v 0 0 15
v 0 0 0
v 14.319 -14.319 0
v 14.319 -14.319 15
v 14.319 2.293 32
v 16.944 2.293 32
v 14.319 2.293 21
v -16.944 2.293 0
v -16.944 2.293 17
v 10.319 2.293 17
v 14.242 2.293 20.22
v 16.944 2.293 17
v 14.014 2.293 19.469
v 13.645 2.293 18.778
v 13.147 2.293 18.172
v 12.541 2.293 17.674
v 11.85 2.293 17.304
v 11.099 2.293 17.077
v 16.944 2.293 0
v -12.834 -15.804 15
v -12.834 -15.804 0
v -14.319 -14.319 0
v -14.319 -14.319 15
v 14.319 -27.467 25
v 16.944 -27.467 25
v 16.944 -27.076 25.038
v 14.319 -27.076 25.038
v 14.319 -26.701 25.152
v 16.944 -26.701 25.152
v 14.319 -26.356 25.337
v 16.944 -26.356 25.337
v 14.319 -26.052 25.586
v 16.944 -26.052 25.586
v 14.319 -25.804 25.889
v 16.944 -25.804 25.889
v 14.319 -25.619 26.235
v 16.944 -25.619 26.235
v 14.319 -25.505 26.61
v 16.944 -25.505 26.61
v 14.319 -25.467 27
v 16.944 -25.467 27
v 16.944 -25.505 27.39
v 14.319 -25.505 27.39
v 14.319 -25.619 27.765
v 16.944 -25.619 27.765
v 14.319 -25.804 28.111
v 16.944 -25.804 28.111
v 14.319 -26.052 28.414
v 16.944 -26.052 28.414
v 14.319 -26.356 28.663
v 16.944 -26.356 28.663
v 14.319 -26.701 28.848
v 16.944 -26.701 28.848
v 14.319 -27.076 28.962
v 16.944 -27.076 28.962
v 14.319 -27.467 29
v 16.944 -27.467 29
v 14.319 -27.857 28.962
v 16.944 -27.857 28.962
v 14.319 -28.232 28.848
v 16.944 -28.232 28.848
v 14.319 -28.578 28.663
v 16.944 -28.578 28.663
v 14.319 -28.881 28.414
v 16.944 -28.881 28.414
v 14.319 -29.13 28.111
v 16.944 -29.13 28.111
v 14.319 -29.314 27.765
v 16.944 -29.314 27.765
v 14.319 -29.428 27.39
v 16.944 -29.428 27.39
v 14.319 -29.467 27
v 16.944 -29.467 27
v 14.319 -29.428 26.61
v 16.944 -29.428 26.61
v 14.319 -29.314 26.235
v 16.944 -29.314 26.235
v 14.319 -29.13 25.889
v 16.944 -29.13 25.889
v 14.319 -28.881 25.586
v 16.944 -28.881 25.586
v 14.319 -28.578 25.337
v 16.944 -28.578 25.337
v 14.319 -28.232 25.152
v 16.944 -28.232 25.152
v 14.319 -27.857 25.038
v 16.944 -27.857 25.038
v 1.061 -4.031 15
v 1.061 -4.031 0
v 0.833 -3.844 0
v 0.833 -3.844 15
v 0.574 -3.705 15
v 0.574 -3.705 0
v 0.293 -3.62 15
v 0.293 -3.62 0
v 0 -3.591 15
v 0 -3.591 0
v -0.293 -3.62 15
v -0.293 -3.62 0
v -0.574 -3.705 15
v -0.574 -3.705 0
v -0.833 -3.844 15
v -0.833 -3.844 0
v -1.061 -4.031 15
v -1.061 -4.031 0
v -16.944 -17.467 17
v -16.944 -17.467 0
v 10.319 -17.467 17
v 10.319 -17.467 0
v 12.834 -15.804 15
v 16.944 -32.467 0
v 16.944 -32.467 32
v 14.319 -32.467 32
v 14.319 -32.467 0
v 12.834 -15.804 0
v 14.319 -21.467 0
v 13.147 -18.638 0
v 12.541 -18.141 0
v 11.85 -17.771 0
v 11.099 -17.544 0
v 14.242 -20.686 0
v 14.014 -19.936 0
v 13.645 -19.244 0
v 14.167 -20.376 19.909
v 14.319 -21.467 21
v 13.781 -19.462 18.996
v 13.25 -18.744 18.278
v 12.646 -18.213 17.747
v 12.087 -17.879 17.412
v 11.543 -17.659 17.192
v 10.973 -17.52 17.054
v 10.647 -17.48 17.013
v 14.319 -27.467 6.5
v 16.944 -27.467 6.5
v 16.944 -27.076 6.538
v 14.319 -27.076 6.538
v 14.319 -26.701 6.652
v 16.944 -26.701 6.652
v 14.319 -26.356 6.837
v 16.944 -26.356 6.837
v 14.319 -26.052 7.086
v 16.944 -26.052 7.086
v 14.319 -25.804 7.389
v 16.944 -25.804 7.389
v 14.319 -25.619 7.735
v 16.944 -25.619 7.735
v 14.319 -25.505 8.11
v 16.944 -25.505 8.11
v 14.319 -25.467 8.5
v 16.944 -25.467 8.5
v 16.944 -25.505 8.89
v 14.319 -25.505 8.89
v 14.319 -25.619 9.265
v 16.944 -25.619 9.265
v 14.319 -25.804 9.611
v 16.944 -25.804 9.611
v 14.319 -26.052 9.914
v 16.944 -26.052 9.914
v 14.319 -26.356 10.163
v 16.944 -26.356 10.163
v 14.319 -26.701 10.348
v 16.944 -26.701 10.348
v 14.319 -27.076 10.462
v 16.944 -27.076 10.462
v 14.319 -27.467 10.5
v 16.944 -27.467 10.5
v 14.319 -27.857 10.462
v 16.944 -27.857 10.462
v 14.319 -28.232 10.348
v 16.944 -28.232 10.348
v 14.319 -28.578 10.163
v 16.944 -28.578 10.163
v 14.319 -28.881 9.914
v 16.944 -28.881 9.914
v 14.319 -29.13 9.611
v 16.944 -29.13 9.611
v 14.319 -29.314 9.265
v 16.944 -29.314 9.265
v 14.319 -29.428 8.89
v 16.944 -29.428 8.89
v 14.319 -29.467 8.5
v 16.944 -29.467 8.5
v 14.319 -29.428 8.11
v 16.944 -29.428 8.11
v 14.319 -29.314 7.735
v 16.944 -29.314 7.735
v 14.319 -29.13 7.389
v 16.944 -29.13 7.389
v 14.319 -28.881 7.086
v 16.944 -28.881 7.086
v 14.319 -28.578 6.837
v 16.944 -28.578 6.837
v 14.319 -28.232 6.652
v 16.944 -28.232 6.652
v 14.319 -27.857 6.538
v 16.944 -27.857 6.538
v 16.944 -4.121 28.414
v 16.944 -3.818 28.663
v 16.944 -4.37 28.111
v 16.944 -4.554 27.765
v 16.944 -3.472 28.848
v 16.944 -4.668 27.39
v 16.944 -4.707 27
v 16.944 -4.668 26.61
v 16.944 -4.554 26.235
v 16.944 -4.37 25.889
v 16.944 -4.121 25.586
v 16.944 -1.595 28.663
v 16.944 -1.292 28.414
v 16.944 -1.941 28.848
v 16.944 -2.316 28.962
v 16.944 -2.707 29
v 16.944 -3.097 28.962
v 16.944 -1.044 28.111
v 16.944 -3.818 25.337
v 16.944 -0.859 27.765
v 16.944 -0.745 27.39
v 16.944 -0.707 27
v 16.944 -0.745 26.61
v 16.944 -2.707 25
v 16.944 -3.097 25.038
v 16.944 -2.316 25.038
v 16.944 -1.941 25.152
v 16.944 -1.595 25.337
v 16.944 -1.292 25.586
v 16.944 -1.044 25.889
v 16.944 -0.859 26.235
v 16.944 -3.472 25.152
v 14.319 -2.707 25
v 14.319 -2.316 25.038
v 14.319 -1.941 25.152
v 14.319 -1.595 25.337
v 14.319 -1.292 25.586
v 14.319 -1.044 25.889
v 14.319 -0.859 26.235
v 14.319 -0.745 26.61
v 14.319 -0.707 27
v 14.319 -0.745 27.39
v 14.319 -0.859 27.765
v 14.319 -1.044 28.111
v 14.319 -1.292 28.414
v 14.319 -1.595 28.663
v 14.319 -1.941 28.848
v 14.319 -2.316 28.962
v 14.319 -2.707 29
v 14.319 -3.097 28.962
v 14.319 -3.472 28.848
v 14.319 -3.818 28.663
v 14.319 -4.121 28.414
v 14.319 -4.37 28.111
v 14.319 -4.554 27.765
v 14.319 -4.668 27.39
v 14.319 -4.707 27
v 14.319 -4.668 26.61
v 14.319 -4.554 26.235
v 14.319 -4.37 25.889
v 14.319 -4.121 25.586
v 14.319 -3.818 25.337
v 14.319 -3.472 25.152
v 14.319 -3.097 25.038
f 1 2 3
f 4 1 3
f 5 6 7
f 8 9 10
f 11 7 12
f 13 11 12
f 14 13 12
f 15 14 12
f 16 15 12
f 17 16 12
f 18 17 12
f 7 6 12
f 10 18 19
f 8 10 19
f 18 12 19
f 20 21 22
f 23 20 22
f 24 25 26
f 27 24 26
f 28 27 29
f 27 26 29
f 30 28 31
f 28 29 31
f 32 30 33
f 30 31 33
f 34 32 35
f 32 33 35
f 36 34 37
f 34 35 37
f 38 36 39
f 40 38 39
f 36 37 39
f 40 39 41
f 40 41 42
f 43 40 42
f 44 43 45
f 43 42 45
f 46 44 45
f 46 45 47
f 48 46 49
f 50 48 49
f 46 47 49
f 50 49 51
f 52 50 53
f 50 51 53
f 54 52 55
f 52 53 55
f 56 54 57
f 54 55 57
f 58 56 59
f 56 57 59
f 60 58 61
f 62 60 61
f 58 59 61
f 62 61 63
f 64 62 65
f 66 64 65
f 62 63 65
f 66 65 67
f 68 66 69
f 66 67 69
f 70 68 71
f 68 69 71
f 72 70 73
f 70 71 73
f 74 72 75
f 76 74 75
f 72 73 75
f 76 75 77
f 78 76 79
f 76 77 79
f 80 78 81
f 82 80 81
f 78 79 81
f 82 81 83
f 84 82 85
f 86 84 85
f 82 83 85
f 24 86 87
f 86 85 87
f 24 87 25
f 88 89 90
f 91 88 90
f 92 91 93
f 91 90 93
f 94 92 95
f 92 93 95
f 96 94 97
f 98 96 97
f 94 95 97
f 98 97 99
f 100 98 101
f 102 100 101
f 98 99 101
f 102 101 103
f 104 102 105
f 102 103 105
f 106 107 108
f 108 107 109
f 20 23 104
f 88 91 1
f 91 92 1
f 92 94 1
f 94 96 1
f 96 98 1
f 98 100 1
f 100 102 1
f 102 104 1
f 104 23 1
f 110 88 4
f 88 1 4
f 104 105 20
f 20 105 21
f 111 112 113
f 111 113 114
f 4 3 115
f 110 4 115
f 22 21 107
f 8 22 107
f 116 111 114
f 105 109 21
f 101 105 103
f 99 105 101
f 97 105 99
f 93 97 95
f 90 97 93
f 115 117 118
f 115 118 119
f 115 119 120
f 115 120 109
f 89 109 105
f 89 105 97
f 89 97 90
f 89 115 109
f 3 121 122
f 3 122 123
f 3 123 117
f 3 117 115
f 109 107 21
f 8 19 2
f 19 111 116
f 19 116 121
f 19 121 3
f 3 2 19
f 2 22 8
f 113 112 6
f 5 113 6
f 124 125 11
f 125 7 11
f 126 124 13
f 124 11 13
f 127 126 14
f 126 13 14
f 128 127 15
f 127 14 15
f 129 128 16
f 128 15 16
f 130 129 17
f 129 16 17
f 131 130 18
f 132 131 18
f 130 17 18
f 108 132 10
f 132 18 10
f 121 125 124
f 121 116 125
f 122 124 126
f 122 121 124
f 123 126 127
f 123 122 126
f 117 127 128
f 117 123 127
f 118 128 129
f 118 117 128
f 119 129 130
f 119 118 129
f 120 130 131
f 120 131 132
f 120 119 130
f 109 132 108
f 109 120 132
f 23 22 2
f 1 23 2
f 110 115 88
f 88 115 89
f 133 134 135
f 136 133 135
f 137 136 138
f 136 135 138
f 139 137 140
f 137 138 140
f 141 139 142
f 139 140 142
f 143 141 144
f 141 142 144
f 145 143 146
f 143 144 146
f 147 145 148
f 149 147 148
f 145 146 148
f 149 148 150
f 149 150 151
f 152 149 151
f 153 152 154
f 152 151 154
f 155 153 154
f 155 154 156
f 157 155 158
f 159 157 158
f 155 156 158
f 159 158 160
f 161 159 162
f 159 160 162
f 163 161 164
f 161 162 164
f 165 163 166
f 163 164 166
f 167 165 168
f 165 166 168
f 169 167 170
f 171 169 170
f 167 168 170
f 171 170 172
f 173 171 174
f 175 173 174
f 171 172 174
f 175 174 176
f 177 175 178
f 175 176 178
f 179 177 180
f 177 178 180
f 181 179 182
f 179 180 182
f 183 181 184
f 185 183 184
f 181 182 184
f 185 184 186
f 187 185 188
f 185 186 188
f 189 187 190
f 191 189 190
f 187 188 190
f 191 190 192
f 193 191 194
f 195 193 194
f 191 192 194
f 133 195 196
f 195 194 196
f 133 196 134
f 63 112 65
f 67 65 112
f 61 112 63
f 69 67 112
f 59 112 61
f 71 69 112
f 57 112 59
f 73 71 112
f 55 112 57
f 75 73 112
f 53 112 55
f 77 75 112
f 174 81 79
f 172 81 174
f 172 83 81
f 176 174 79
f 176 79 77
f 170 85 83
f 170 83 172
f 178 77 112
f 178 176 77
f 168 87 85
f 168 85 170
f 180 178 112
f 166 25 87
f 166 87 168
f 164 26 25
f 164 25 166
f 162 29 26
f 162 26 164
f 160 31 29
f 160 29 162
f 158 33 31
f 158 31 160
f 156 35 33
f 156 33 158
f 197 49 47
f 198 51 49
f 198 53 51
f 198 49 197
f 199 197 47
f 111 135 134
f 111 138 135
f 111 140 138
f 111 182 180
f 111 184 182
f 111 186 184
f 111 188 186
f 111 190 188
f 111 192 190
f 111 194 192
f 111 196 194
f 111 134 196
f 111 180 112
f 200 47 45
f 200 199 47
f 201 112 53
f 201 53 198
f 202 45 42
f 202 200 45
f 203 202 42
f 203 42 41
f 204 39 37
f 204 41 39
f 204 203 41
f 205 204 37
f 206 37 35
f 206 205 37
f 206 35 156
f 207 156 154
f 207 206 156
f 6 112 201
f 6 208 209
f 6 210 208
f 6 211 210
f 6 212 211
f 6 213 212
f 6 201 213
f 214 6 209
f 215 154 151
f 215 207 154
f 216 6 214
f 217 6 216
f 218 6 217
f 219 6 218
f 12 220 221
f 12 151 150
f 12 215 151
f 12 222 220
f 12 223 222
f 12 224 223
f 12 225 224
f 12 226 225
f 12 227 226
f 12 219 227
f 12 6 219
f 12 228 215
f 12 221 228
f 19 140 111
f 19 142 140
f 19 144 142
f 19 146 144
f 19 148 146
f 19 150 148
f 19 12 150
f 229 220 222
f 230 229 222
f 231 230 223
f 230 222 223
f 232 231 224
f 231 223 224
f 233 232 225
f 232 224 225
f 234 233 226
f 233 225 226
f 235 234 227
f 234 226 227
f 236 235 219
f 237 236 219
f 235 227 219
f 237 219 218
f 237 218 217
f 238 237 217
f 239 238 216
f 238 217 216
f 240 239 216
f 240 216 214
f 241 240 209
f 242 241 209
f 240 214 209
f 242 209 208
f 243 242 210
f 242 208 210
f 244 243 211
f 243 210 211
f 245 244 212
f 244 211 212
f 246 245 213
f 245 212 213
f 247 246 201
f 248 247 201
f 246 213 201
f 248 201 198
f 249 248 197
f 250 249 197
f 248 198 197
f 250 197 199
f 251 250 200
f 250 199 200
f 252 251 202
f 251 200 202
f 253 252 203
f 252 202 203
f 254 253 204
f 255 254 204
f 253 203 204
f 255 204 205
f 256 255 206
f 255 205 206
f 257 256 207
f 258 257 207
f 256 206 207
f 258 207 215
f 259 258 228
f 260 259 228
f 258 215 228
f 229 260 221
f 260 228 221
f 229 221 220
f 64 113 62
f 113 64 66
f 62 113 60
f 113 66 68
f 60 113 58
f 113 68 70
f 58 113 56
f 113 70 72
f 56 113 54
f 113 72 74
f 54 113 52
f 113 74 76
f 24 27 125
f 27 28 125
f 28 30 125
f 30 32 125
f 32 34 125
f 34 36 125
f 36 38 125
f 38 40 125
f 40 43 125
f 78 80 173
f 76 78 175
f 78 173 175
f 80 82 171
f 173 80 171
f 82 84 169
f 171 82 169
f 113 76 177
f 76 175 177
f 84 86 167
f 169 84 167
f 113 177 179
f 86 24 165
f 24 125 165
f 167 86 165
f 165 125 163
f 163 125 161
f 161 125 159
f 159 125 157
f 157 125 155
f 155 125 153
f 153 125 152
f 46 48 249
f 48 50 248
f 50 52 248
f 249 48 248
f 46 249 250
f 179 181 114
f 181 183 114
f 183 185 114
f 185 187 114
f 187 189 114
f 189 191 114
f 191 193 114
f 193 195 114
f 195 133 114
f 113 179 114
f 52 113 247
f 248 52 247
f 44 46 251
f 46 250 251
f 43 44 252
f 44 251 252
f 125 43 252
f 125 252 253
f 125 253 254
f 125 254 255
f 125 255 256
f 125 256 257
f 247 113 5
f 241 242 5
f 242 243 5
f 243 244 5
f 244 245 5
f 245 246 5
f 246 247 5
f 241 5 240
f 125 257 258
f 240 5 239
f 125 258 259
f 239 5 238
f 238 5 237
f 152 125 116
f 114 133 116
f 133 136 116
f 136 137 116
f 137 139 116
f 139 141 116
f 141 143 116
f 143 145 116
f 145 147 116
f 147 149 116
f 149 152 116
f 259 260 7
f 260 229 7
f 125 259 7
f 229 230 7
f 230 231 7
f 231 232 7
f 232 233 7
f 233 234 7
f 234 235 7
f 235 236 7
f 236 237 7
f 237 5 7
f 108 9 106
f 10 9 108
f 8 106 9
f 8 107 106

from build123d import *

# Parameters (mm, degrees)
SKETCH2_W           = 33.887326606
SKETCH2_H           = 19.760086797
BOSS_EXTRUDE1_DEPTH = 15
SKETCH3_W           = 33.887326606
SKETCH3_H           = 19.760086797
BOSS_EXTRUDE2_DEPTH = 2
SKETCH6_W           = 32
SKETCH6_H           = 34.760086797
SKETCH6_R           = 2
BOSS_EXTRUDE4_DEPTH = 2.624753
FILLET1_R           = 4


with BuildPart() as part:
    # Sketch2 → Boss-Extrude1 (new body)
    with BuildSketch(Plane.XY):
        with Locations((0, -7.586628603)):
            Rectangle(SKETCH2_W, SKETCH2_H)
        with BuildLine():
            Line((0, 0), (14.318912319, -14.318912319))
            Line((14.318912319, -14.318912319), (12.833988079, -15.80383656))
            Line((12.833988079, -15.80383656), (1.060660172, -4.030508653))
            ThreePointArc((1.060660172, -4.030508653), (0, -3.591168825), (-1.060660172, -4.030508653))
            Line((-1.060660172, -4.030508653), (-12.833988079, -15.80383656))
            Line((-12.833988079, -15.80383656), (-14.318912319, -14.318912319))
            Line((-14.318912319, -14.318912319), (0, 0))
        make_face(mode=Mode.SUBTRACT)
    extrude(amount=BOSS_EXTRUDE1_DEPTH)

    # Sketch3 → Boss-Extrude2 (add)
    with BuildSketch(Plane.XY.offset(15)):
        with Locations((0, -7.586628603)):
            Rectangle(SKETCH3_W, SKETCH3_H)
    extrude(amount=BOSS_EXTRUDE2_DEPTH)

    # Sketch6 → Boss-Extrude4 (add)
    with BuildSketch(Plane(origin=(16.943663303, 0, 0), x_dir=(0, 0, -1), z_dir=(1, 0, 0))):
        with Locations((-16, -15.086628602)):
            Rectangle(SKETCH6_W, SKETCH6_H)
        with Locations((-8.5, -27.466672001)):
            Circle(SKETCH6_R, mode=Mode.SUBTRACT)
        with Locations((-27, -27.466672001)):
            Circle(SKETCH6_R, mode=Mode.SUBTRACT)
        with Locations((-27, -2.706585204)):
            Circle(SKETCH6_R, mode=Mode.SUBTRACT)
    extrude(amount=-BOSS_EXTRUDE4_DEPTH)

    # Fillet1
    fillet1_edges = [part.edges().sort_by_distance(p)[0] for p in [
        (14.318910303, -7.586628602, 17),
        (14.318910303, -17.466672001, 8.5),
    ]]
    fillet(fillet1_edges, radius=FILLET1_R)


solid = part.part
